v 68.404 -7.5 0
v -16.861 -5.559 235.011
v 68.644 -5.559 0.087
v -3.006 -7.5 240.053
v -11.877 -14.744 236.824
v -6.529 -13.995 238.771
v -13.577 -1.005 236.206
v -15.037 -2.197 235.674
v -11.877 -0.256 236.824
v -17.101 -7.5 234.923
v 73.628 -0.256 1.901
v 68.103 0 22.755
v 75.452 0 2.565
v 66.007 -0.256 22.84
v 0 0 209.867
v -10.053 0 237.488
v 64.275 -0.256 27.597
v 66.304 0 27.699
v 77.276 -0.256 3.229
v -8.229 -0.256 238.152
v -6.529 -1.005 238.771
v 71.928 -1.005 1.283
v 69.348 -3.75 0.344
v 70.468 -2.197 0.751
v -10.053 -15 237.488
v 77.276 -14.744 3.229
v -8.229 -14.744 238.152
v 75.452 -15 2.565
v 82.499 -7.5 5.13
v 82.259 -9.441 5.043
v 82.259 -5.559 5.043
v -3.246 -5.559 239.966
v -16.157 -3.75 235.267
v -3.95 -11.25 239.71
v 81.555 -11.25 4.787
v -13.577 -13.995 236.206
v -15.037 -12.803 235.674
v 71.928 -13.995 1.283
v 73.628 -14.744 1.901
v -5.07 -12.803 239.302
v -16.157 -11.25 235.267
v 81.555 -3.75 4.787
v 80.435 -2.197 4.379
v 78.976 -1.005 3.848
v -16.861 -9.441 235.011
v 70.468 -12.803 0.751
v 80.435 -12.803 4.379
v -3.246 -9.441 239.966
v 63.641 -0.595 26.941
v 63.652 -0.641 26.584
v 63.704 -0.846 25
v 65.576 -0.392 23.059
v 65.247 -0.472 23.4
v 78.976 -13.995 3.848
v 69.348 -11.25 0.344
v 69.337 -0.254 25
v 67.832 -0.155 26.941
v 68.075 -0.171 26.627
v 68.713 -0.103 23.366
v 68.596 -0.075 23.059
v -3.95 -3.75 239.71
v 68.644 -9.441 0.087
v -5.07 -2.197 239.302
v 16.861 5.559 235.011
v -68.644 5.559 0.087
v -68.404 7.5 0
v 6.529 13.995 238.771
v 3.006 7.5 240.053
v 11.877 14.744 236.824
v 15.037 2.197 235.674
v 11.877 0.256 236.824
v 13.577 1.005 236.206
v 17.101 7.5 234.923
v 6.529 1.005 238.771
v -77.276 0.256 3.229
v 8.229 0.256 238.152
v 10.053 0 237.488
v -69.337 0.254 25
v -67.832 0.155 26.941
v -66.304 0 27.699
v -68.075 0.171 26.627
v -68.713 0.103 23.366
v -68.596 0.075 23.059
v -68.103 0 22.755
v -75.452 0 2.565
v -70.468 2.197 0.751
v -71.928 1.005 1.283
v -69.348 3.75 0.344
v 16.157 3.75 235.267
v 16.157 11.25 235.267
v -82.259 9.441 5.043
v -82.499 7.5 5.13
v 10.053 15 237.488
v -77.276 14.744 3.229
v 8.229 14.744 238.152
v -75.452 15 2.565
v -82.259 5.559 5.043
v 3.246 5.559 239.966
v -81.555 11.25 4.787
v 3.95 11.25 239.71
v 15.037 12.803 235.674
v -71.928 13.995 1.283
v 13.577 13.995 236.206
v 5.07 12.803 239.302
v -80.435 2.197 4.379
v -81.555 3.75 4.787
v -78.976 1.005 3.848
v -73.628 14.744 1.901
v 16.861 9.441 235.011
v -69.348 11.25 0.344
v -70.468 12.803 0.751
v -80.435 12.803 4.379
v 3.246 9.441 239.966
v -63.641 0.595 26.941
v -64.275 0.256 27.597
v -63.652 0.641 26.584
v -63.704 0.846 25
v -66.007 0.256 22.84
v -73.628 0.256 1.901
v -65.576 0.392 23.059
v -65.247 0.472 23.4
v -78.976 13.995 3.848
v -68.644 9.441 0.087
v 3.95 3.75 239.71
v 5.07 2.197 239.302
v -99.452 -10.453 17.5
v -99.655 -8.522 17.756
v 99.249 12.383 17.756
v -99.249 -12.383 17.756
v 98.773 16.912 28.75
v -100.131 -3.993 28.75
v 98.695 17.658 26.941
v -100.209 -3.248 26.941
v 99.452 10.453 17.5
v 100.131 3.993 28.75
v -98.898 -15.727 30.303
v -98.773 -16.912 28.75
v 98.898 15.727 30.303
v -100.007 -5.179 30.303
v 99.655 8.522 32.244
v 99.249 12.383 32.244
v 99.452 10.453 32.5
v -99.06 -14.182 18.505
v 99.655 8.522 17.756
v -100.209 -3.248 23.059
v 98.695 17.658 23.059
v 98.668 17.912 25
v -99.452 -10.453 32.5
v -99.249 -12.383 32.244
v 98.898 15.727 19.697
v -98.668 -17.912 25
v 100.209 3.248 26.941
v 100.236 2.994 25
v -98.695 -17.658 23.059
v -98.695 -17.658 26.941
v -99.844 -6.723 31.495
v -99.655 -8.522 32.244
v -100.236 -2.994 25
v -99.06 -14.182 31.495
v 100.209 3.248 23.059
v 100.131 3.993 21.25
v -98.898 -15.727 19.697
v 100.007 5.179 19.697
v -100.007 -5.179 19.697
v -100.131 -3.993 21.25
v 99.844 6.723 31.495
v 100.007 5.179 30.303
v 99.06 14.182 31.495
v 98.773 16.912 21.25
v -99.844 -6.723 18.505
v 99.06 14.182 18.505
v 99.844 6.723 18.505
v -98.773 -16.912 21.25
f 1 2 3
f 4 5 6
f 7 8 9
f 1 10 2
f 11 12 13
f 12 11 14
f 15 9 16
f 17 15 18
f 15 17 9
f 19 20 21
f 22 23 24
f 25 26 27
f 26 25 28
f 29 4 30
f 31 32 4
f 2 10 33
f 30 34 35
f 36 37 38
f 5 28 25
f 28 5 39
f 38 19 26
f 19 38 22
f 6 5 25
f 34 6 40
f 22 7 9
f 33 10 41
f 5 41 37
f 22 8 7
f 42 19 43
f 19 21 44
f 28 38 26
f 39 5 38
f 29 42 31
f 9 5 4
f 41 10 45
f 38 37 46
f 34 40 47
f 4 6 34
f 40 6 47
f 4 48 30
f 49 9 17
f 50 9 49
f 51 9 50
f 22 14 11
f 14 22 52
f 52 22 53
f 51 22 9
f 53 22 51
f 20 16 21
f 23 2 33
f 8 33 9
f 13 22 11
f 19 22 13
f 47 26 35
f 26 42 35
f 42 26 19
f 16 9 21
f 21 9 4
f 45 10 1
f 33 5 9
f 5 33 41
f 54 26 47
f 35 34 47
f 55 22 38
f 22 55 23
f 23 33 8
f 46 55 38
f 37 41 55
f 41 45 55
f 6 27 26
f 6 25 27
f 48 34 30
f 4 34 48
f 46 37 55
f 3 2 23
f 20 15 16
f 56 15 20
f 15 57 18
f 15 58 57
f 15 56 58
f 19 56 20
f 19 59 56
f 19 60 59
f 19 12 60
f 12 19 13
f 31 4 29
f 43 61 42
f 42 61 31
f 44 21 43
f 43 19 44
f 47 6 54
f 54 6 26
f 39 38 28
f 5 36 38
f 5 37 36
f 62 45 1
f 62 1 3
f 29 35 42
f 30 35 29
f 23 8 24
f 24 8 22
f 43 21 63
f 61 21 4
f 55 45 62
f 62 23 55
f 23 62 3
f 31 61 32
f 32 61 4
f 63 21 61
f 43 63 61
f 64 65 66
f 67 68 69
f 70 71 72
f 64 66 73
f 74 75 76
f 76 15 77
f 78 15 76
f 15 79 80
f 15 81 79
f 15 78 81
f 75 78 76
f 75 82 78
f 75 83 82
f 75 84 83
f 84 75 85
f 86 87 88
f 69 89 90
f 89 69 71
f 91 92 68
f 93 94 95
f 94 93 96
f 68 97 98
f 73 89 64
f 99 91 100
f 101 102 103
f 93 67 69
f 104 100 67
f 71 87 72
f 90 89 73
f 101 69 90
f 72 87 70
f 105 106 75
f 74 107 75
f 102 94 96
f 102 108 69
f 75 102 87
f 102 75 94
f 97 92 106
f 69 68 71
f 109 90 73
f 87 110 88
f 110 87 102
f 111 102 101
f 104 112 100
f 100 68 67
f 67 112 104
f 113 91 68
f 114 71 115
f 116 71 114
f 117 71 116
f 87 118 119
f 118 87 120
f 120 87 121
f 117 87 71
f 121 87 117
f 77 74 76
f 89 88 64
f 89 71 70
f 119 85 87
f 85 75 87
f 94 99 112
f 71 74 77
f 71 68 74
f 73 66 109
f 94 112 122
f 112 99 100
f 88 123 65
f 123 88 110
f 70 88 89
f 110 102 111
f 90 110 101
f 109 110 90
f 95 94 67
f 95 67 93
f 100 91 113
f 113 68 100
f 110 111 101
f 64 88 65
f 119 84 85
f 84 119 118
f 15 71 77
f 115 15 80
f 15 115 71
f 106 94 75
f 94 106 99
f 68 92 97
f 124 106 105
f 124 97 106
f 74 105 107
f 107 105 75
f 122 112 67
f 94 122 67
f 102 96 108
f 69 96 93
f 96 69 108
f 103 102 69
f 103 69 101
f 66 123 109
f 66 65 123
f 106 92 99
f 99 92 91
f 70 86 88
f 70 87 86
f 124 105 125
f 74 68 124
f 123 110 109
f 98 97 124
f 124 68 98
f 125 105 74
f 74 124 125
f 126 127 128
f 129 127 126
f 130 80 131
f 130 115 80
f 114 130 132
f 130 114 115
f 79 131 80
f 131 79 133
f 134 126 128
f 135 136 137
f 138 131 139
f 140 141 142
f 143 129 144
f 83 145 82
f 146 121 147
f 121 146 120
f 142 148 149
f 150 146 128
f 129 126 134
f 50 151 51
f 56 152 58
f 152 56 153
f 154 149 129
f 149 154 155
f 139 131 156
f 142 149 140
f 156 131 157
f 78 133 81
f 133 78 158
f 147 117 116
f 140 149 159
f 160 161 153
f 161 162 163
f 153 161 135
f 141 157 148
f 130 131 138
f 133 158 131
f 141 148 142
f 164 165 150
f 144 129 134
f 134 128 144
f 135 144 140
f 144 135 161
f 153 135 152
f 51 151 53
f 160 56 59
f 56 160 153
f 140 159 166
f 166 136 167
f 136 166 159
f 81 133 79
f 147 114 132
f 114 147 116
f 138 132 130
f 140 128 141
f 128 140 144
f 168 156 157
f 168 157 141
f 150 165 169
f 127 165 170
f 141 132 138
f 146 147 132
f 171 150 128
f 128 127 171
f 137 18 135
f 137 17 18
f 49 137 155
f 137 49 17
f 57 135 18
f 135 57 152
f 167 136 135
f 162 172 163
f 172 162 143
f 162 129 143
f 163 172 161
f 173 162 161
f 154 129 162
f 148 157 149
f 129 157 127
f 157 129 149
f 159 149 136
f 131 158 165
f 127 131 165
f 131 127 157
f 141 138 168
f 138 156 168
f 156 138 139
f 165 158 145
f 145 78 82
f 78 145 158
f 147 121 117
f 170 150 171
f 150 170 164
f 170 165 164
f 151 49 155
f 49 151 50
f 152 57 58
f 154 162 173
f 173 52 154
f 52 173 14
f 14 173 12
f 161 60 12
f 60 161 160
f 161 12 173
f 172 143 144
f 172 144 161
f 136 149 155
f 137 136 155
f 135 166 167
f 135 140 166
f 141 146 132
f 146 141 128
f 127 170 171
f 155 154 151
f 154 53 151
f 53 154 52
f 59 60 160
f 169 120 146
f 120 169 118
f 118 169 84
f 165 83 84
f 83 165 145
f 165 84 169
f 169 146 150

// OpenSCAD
// file: fanta.scad
// Johan Govers 2015
// OpenSCAD version 2014.03 


pd = 15; // paal diameter

module paal(l, center) {
  cylinder(h = l, r=pd / 2, center=center);
  echo("paal", l, "cm");
}


module ton() {
  color("blue")
  cylinder(h = 100, r=50, center=true);
  echo("ton 200l");  
}

module poot(p, length, hoek) {
  for (i = [0:360/p:360-(360/p)]) { 
    translate([0,0, sin(90-hoek) * (length - 50)]) 
    rotate([0, 180-hoek, i]) 
    translate([-pd/2,-pd/2,-50]) 
    paal(length, false);
  }
}

module driepoot(length, hoek) {
  poot(3, length, hoek);
}

module vierpoot(length, hoek) {
  poot(4, length, hoek);
}

// l=length, b=breet, m=maasgroote
module net(l, b, m) {
  for (i = [-b/2:m:b/2])
  translate([0,i, 0]) 
  rotate([0,90,0]) 
  cylinder(l, r=1, center=true);

  for (i = [-l/2:m:l/2])
  translate([i,0, 0]) 
  rotate([90,0,0]) 
  cylinder(b, r=1, center=true);
  echo ("net ", l, "x", b, " cm");
}

module autoband(inch_buiten = 28, inch_binnen = 20, h = 20) {
  color([0.5,0.5,0.5])
  rotate(a=90, v=[1,0,0]) 
  difference() {
    intersection() {
      sphere(r=inch_buiten*2.56/2, center=true);
      cylinder(h = h, r=inch_buiten*2.56/2,  center=true);
    }
    cylinder(h = 500, r=inch_binnen*2.56/2,  center=true);
  }
  echo("autoband");
}







// kussengevecht();
// ladder();
// autobandMuur();
// poort(500, 600);
// valnet();
// net(500,300,15);
// klimDrieHoek(500, 30);
// aframe();
// schoef();
// glijbaan();
// main file
include <fanta.scad>

module aframe() {
  poot(2, 250, 20);
  translate([0,0, 25]) 
  rotate([0,90,6]) 
  paal(200, true);
}

aframe();
